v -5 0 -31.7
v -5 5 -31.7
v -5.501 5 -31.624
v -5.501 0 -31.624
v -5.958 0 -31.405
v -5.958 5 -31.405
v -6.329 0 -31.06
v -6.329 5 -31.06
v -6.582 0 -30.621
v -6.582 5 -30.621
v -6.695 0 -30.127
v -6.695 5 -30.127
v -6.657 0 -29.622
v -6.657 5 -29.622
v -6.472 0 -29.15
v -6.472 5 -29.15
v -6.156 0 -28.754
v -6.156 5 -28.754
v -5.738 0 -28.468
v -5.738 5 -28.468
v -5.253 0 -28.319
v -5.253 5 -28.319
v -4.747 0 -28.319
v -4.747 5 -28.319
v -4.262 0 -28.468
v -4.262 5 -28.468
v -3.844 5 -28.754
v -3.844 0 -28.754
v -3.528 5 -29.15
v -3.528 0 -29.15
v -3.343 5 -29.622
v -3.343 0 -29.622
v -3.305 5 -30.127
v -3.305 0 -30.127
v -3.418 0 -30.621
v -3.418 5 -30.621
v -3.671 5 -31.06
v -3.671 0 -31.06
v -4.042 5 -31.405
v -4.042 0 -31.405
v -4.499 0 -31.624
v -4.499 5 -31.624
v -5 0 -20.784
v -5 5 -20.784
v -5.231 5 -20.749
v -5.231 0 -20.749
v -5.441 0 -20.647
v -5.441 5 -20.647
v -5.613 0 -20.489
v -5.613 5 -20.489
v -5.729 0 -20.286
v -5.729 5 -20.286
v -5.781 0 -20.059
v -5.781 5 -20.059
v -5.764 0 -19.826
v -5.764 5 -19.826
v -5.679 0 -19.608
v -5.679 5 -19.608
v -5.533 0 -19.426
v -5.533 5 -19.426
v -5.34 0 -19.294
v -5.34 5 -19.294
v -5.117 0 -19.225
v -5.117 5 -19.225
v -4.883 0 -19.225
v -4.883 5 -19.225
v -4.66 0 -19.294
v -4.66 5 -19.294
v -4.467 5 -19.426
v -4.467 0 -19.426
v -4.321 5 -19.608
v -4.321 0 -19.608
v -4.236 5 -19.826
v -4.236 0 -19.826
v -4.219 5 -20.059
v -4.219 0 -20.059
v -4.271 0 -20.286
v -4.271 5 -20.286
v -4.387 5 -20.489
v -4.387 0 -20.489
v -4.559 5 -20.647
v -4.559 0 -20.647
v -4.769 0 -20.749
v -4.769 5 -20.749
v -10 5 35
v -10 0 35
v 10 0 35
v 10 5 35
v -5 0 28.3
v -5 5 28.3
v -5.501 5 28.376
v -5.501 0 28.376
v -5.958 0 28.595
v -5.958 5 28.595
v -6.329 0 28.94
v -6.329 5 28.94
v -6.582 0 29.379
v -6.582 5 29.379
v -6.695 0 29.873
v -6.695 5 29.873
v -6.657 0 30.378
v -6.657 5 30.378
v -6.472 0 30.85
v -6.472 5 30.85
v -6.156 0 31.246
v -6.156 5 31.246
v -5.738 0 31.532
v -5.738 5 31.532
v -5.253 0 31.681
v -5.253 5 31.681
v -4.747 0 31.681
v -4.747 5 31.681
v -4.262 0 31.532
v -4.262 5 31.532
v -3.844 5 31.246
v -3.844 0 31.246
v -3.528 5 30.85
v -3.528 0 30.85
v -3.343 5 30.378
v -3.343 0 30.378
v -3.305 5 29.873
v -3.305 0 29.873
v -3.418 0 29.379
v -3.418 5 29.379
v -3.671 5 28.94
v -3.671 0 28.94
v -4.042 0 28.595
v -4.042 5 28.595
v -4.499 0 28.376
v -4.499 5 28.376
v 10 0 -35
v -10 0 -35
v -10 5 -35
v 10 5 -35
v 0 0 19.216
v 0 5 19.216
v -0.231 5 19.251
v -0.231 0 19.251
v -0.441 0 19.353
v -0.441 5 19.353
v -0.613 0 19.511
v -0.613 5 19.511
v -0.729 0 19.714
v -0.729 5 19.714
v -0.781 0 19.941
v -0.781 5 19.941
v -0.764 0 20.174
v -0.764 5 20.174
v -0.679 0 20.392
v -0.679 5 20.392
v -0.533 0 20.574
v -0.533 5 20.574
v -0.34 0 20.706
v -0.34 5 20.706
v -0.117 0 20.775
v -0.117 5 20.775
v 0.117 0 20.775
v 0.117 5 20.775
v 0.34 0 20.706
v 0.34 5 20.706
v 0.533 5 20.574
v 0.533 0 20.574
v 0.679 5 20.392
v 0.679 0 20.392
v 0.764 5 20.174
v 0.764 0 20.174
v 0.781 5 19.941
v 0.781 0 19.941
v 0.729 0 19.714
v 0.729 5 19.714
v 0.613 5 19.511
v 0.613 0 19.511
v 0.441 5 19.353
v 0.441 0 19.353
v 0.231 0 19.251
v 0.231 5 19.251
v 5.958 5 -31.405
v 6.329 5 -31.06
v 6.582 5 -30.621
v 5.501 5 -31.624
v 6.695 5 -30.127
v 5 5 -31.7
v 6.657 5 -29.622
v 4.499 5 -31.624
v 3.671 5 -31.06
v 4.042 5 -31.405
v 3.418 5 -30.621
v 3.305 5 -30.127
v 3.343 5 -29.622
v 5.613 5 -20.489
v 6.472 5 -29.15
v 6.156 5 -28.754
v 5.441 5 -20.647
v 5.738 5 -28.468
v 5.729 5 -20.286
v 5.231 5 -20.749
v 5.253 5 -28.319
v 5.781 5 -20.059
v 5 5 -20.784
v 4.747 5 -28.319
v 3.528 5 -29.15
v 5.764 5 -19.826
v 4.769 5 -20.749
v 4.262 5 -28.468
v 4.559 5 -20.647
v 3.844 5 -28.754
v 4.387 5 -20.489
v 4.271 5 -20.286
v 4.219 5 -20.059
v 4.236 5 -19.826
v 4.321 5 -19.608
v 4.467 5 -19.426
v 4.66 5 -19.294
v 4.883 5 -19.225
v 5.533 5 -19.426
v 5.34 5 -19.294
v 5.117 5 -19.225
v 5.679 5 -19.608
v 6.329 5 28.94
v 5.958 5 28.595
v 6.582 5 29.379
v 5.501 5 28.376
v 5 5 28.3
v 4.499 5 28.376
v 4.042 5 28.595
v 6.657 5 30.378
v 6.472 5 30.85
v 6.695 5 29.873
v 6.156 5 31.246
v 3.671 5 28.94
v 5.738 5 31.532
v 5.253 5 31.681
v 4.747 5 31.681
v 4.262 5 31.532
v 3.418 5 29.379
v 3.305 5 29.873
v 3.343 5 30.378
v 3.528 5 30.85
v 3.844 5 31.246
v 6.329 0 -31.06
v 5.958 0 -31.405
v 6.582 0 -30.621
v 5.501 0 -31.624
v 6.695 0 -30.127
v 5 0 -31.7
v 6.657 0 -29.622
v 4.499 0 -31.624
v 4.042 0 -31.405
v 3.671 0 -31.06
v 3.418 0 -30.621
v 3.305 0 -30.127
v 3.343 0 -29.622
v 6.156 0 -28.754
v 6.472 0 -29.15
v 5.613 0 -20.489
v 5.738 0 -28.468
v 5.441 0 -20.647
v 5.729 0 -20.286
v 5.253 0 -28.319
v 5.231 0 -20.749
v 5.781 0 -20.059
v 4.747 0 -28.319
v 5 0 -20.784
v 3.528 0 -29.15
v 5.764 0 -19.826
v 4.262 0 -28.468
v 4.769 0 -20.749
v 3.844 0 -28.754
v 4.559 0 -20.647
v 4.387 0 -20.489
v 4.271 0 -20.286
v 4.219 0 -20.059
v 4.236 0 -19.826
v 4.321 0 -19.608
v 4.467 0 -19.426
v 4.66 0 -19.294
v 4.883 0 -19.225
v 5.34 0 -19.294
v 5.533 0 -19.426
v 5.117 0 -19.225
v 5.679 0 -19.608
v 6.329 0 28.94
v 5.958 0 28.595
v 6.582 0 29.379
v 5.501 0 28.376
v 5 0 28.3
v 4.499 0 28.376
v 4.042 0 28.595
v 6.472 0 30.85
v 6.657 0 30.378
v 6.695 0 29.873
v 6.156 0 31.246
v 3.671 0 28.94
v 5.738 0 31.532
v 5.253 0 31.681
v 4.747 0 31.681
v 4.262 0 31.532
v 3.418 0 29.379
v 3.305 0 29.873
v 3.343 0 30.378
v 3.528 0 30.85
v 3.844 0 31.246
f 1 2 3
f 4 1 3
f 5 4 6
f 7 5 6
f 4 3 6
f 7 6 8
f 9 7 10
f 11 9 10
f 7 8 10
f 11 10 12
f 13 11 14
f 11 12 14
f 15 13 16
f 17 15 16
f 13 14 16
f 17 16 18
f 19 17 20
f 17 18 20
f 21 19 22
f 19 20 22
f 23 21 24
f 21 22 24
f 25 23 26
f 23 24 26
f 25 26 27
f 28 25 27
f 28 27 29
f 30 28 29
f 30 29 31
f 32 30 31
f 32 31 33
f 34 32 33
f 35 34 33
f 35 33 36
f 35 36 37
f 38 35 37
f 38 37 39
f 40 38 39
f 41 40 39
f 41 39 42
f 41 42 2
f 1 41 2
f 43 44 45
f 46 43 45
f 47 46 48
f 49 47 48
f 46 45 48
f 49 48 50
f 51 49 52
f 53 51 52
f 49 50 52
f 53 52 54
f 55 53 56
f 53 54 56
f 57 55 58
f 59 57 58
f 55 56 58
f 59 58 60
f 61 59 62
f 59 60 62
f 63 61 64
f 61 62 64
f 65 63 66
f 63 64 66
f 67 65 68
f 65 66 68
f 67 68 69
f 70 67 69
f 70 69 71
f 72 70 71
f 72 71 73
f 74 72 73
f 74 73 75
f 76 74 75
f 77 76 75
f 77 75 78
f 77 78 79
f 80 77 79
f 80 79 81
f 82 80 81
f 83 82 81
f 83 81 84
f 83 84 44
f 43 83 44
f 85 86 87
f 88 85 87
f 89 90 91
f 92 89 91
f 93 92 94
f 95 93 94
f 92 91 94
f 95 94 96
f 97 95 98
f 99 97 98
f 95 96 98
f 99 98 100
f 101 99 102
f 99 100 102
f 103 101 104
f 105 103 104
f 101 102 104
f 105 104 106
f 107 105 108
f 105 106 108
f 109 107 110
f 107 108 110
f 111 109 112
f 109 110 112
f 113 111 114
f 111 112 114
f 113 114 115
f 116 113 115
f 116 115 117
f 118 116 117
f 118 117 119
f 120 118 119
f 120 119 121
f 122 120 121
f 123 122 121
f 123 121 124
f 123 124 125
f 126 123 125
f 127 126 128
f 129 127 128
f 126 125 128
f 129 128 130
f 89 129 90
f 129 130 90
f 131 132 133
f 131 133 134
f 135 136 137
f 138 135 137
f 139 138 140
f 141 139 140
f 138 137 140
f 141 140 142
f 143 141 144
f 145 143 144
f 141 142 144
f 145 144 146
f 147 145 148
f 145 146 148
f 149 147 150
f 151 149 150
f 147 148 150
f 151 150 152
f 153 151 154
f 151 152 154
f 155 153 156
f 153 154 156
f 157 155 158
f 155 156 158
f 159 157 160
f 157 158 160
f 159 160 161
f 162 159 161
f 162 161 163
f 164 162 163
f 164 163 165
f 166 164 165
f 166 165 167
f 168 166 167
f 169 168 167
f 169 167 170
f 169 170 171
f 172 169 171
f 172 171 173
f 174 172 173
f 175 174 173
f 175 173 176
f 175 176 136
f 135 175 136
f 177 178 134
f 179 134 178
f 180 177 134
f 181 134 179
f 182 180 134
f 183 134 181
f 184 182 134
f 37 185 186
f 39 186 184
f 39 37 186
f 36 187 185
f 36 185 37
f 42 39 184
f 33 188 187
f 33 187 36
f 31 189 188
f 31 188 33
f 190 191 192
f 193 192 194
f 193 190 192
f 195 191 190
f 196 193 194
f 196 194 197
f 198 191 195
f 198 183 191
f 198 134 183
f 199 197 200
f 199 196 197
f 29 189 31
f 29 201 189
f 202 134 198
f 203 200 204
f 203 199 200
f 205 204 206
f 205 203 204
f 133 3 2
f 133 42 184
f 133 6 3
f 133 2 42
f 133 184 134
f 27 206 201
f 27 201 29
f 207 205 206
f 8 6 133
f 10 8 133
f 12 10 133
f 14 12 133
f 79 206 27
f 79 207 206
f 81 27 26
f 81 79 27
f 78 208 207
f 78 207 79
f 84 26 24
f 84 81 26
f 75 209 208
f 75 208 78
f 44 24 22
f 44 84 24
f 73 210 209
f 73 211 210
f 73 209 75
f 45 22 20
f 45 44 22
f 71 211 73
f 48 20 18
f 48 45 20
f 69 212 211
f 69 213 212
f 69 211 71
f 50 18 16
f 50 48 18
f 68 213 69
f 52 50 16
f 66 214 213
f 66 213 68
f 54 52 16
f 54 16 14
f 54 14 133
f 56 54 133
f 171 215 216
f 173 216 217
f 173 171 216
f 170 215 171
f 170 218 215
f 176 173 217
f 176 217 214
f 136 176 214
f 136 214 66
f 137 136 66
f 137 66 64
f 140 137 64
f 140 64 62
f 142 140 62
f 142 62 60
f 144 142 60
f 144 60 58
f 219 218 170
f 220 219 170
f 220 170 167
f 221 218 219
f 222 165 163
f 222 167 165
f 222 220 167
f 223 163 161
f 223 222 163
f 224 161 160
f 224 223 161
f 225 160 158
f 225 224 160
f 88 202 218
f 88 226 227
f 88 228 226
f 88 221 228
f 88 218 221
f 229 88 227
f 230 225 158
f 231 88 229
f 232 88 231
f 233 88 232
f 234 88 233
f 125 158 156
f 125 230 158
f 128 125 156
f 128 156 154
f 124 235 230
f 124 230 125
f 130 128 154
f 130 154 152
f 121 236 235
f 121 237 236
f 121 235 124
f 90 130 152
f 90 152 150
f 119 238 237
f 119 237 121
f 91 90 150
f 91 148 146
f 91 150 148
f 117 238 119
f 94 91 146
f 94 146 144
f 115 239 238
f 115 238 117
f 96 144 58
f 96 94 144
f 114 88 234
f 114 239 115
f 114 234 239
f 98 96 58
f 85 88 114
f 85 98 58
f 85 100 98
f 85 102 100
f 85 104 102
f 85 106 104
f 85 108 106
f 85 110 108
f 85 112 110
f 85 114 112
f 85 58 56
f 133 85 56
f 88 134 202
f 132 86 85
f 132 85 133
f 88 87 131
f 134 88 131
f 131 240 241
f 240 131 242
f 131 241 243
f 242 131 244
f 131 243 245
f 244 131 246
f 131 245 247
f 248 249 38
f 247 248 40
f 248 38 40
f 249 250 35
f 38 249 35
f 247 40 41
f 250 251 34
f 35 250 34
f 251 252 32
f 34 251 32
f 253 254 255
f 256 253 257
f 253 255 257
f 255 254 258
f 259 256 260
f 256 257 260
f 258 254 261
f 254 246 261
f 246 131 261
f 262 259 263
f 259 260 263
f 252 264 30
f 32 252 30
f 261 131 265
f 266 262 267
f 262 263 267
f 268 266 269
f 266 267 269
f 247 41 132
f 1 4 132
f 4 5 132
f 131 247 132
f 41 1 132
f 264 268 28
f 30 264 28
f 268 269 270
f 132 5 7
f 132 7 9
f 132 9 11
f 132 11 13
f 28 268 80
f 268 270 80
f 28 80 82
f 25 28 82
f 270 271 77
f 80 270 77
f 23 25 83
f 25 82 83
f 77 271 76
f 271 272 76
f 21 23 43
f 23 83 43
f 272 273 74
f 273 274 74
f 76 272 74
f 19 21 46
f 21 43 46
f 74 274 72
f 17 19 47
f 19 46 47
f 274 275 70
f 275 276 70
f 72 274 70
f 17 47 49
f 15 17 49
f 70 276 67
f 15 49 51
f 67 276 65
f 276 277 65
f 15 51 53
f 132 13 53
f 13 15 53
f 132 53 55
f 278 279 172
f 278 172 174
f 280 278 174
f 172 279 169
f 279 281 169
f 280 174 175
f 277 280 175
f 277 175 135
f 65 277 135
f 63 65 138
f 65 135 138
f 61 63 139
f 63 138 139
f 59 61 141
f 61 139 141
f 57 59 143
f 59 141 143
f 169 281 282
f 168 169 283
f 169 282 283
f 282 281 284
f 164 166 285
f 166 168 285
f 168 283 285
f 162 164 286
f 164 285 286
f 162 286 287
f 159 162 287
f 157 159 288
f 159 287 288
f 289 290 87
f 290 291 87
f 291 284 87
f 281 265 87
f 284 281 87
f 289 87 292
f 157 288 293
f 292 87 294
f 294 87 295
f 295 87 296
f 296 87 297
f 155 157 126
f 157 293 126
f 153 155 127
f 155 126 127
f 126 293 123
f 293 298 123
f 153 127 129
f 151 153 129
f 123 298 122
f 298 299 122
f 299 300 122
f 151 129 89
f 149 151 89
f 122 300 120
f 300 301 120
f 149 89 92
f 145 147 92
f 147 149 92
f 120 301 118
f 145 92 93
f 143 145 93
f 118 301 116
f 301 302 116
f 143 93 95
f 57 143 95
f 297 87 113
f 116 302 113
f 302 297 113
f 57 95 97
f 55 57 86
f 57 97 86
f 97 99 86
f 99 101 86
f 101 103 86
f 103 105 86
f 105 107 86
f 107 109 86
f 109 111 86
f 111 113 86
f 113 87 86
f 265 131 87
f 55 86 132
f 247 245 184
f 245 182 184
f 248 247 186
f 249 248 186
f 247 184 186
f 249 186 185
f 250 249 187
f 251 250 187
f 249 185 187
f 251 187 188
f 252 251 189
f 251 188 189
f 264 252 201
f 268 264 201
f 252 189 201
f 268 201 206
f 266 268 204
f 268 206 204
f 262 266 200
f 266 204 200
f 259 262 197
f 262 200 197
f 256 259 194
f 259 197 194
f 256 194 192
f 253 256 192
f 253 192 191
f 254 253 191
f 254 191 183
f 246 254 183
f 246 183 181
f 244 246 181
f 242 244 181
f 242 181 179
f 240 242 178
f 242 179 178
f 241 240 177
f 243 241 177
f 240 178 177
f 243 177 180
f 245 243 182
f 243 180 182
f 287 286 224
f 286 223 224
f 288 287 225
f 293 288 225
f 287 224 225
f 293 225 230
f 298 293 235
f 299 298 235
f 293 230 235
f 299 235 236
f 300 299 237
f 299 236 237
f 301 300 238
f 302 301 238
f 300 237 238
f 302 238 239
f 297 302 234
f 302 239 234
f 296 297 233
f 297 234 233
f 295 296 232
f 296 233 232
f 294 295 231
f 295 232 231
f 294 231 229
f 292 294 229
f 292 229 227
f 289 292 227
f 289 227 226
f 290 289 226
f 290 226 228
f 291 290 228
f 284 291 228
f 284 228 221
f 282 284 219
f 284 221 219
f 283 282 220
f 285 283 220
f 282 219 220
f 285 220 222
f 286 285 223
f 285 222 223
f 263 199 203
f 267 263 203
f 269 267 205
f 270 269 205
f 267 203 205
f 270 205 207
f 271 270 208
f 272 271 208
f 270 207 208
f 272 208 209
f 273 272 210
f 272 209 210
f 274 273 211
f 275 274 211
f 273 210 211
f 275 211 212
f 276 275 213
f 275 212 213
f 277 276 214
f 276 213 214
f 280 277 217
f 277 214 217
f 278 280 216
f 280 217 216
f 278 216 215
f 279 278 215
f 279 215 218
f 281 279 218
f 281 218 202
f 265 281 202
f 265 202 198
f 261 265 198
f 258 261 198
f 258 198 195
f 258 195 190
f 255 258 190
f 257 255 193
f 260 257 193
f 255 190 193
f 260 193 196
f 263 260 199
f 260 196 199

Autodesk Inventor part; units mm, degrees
ref_plane "YZ Plane" through (0, 0, 0) normal (1, 0, 0) x (0, 1, 0)
ref_plane "XZ Plane" through (0, 0, 0) normal (0, 1, 0) x (-1, 0, 0)
ref_plane "XY Plane" through (0, 0, 0) normal (0, 0, 1) x (1, 0, 0)
sketch "Sketch1" plane through (0, 0, 0) normal (0, 1, 0) x (-1, 0, 0)
  line L0 (-10, 25) -> (-10, 0)
  line L1 (10, 0) -> (10, 25)
  line L2 (10, 0) -> (-10, 0) construction
  line L3 (10, 30) -> (-10, 30) construction
  line L4 (10, 25) -> (-10, 25) construction
  line L5 (0, 25) -> (0, 0) construction
  line L6 (10, 20) -> (-10, 20) construction
  line L7 (10, 20) -> (0, 20) construction
  line L8 (0, 20) -> (-10, 20) construction
  line L9 (0, 20) -> (5, 20) construction
  line L10 (0, 20) -> (-5, 20) construction
  line L11 (10, 35) -> (10, 25)
  line L12 (-10, 35) -> (-10, 25)
  line L13 (10, 35) -> (-10, 35)
  line L14 (5, 35) -> (5, 30)
  line L15 (-5, 35) -> (-5, 30)
  line L16 (-10, -25) -> (-10, 0)
  line L17 (10, 0) -> (10, -25)
  line L18 (10, -30) -> (-10, -30) construction
  line L19 (10, -25) -> (-10, -25) construction
  line L20 (0, -25) -> (0, 0) construction
  line L21 (10, -20) -> (-10, -20) construction
  line L22 (10, -20) -> (0, -20) construction
  line L23 (0, -20) -> (-10, -20) construction
  line L24 (0, -20) -> (5, -20) construction
  line L25 (0, -20) -> (-5, -20) construction
  line L26 (10, -35) -> (10, -25)
  line L27 (-10, -35) -> (-10, -25)
  line L28 (10, -35) -> (-10, -35)
  line L29 (5, -35) -> (5, -30)
  line L30 (-5, -35) -> (-5, -30)
  dimension "d84" = 5
  dimension "d127" = 20
extrude "Extrusion1" add sketch "Sketch1" along normal blind 5
hole "Hole12" at (-5, 0, 30) at (5, 0, 30) at (-5, 0, -30) at (5, 0, -30) direction (0, 1, 0) diameter 3.4 end through all clearance for "Socket Head Cap Screw ISO 4762" size "M3" standard "ISO"
hole "Hole13" at (0, 0, 20) at (-5, 0, -20) at (5, 0, -20) direction (0, 1, 0) diameter 1.567 end through all thread size "M2x0.4" class "6H" standard "ISO Metric profile"
properties part number "mount-base" material "Copper"
